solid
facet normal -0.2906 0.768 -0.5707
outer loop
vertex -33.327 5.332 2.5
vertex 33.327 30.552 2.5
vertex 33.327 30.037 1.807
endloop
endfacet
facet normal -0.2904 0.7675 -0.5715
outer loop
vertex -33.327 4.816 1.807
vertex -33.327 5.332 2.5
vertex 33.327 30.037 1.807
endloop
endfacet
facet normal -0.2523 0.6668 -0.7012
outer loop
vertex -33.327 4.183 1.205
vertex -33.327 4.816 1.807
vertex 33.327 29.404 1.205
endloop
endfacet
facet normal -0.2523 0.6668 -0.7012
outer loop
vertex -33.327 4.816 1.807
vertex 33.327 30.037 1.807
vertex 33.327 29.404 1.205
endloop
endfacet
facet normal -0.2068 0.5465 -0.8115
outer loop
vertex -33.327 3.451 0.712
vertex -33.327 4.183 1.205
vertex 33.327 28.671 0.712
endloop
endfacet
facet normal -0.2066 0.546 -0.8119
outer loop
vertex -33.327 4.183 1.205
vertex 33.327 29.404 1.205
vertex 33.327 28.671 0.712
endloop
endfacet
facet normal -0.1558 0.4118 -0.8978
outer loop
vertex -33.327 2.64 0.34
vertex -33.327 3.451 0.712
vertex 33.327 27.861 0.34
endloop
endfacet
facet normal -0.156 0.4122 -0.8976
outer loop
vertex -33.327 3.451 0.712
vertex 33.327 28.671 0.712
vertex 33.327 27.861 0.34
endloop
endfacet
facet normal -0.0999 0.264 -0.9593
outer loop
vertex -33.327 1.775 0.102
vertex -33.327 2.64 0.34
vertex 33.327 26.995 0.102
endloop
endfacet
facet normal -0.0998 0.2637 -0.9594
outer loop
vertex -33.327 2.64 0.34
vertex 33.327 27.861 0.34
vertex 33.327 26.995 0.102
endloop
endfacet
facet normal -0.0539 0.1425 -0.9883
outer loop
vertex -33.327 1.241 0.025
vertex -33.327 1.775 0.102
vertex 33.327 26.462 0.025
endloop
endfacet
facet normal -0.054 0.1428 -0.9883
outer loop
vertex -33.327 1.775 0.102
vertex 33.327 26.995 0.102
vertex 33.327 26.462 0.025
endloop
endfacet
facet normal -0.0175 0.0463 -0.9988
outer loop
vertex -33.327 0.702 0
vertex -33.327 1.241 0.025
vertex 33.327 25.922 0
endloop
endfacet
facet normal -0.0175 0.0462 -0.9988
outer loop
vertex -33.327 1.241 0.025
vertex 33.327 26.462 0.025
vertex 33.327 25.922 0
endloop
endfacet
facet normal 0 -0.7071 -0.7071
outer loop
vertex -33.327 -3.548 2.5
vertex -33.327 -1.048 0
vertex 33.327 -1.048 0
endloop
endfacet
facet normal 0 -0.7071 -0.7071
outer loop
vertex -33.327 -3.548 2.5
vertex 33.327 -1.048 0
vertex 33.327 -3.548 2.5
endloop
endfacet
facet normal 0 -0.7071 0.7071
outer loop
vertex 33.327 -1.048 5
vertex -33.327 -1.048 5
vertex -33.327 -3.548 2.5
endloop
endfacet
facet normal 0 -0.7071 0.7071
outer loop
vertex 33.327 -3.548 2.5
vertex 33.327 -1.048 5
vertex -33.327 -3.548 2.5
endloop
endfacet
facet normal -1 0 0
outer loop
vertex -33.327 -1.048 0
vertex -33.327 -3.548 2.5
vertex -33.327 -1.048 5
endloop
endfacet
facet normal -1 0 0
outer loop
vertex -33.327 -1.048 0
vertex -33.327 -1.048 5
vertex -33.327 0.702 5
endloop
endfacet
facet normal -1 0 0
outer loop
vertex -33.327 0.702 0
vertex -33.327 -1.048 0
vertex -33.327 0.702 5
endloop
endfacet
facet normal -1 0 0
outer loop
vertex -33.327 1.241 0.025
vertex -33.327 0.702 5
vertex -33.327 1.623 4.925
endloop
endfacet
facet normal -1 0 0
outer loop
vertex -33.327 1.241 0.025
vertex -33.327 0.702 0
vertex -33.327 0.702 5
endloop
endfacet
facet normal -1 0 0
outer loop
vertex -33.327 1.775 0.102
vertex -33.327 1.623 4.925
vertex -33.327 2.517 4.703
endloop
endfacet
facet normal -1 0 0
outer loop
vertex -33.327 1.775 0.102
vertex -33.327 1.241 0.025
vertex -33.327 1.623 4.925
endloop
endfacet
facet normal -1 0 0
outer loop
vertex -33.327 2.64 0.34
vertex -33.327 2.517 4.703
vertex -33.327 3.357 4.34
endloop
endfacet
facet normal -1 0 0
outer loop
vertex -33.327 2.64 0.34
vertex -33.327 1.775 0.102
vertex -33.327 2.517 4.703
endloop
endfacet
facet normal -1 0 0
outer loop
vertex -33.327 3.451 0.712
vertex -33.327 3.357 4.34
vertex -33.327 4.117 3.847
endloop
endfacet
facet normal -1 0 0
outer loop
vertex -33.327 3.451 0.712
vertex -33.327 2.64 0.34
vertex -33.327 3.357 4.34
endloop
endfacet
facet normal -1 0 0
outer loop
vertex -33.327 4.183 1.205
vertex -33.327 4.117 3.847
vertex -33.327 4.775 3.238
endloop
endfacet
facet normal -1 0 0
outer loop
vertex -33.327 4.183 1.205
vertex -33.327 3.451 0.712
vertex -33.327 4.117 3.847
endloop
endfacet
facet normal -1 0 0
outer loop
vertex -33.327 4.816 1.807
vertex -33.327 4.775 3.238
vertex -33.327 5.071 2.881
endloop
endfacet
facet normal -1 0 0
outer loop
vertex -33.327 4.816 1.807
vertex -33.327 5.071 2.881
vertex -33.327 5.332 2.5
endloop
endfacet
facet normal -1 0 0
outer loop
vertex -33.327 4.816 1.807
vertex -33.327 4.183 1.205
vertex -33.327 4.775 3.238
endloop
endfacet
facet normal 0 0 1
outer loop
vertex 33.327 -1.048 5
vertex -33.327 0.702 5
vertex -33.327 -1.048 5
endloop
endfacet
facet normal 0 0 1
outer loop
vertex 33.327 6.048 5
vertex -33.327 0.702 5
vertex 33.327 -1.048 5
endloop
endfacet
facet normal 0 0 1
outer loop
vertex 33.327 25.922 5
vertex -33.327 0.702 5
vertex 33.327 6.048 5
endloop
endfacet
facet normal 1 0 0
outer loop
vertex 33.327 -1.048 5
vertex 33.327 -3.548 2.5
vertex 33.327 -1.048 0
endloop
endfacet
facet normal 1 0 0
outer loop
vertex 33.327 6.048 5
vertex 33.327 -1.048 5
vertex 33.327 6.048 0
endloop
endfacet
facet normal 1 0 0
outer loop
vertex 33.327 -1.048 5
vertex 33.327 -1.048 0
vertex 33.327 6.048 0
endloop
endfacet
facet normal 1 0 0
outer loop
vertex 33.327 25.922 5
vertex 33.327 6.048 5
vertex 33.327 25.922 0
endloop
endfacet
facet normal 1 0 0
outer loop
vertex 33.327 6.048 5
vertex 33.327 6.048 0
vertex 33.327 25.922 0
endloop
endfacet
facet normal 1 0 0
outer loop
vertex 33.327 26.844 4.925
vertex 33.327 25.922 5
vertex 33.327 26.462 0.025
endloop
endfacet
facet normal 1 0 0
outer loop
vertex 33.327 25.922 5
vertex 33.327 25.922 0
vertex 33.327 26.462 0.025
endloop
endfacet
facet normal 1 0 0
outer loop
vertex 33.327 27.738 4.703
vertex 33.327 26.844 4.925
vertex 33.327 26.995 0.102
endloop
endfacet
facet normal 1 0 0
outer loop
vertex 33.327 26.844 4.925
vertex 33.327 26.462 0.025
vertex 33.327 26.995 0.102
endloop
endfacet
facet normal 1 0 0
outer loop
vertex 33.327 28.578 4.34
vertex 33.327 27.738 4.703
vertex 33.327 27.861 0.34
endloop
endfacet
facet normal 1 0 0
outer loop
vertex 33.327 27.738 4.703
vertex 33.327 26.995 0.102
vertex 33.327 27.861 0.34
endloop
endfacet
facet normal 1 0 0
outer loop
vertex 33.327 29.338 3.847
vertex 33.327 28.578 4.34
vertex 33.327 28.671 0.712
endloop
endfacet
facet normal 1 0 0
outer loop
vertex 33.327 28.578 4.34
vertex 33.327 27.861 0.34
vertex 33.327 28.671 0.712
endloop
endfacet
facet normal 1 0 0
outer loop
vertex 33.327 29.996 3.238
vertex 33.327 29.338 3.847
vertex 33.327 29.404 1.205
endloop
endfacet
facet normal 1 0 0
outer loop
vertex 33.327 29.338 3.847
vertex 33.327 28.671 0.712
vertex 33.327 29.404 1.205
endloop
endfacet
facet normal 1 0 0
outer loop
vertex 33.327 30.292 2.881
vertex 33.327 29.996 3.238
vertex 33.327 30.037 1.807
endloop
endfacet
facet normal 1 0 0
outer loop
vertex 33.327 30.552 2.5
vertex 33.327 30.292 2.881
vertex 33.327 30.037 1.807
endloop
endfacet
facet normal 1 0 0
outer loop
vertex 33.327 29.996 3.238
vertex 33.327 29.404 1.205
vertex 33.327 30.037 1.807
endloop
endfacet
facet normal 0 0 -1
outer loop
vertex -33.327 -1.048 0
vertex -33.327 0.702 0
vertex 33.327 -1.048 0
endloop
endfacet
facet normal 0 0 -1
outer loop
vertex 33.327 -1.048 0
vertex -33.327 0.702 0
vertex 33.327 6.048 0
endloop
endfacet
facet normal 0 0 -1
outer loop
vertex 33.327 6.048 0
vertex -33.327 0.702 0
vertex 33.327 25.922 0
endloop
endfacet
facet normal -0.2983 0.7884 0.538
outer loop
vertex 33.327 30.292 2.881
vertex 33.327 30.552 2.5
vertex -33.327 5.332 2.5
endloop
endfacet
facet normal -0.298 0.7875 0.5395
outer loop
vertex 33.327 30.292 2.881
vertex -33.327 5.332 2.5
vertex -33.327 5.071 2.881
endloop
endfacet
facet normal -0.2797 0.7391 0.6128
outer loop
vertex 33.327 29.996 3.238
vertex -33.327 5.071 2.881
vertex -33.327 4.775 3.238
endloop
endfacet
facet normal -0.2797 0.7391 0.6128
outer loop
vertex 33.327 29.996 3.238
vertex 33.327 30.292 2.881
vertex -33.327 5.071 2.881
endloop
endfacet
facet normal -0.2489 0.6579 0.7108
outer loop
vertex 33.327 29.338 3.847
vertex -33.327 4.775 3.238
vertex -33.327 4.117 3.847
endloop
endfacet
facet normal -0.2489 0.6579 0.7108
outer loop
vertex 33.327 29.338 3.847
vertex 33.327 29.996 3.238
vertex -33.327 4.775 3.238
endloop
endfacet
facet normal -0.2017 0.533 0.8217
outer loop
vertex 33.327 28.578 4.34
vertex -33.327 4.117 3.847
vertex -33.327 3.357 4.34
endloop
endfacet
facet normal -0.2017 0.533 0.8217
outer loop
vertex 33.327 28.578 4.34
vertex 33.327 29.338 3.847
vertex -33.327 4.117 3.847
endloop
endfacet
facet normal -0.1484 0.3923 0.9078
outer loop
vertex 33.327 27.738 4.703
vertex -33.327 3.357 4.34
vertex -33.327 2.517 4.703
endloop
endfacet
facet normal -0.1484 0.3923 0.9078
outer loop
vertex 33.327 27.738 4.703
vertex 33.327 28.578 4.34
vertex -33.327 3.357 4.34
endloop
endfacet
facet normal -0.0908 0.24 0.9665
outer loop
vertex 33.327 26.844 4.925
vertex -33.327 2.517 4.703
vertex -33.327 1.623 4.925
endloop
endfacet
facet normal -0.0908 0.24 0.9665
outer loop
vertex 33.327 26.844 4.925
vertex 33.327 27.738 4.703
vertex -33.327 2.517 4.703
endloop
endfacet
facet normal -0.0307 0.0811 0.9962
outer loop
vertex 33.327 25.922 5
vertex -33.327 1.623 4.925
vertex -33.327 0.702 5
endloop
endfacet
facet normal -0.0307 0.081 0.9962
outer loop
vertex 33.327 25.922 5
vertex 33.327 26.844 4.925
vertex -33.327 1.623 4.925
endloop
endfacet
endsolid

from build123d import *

# Parameters (mm, degrees)
F0_W        = 66.6544139385
F0_H        = 12.0955891907
F1_DEPTH    = 5
F2_T1_DEPTH = 96.2663247468
F3_T1_DEPTH = 92.3712438182


# Not quite as in the source:
# - a fillet or chamfer that OpenCascade refuses, or shapes differently, is made with other operations: its cross-section is extruded or revolved along the edge and cut away or added


with BuildPart() as f1:
    # F0 (on Top) → F1 (new body)
    with BuildSketch(Plane.XY):
        Polygon((-33.3272069693, 6.0477945954), (33.3272069693, 6.0477945954), (33.3272069693, 31.2683843076), align=None)
        Rectangle(F0_W, F0_H)
    extrude(amount=F1_DEPTH)

    # F2: fillet of radius 5 on 2 edges, made by hand

    # F2_s2 → F2_t1 (cut)
    with BuildSketch(Plane(origin=(51.1939340465, 19.37067825, 0), x_dir=(0, 0, 1), z_dir=(-0.9352862544, -0.3538921054, 0))):
        with BuildLine():
            ThreePointArc((0, 17.4506545977), (3.5355339059, 15.9861885036), (5, 12.4506545977))
            Line((5, 12.4506545977), (5, 17.4506545977))
            Line((5, 17.4506545977), (0, 17.4506545977))
        make_face()
        with BuildLine():
            ThreePointArc((5, 17.4506545977), (1.4644660941, 15.9861885036), (0, 12.4506545977))
            Line((0, 12.4506545977), (0, 17.4506545977))
            Line((0, 17.4506545977), (5, 17.4506545977))
        make_face()
    extrude(amount=F2_T1_DEPTH, mode=Mode.SUBTRACT)

    # F3: chamfer of 5 on 2 edges, made by hand

    # F3_s2 → F3_t1 (cut)
    with BuildSketch(Plane.YZ.offset(-46.1856219091)):
        Polygon((-1.0477945954, 5), (-6.0477945954, 0), (-6.0477945954, 5), align=None)
        Polygon((-1.0477945954, 0), (-6.0477945954, 5), (-6.0477945954, 0), align=None)
    extrude(amount=F3_T1_DEPTH, mode=Mode.SUBTRACT)


solid = f1.part
